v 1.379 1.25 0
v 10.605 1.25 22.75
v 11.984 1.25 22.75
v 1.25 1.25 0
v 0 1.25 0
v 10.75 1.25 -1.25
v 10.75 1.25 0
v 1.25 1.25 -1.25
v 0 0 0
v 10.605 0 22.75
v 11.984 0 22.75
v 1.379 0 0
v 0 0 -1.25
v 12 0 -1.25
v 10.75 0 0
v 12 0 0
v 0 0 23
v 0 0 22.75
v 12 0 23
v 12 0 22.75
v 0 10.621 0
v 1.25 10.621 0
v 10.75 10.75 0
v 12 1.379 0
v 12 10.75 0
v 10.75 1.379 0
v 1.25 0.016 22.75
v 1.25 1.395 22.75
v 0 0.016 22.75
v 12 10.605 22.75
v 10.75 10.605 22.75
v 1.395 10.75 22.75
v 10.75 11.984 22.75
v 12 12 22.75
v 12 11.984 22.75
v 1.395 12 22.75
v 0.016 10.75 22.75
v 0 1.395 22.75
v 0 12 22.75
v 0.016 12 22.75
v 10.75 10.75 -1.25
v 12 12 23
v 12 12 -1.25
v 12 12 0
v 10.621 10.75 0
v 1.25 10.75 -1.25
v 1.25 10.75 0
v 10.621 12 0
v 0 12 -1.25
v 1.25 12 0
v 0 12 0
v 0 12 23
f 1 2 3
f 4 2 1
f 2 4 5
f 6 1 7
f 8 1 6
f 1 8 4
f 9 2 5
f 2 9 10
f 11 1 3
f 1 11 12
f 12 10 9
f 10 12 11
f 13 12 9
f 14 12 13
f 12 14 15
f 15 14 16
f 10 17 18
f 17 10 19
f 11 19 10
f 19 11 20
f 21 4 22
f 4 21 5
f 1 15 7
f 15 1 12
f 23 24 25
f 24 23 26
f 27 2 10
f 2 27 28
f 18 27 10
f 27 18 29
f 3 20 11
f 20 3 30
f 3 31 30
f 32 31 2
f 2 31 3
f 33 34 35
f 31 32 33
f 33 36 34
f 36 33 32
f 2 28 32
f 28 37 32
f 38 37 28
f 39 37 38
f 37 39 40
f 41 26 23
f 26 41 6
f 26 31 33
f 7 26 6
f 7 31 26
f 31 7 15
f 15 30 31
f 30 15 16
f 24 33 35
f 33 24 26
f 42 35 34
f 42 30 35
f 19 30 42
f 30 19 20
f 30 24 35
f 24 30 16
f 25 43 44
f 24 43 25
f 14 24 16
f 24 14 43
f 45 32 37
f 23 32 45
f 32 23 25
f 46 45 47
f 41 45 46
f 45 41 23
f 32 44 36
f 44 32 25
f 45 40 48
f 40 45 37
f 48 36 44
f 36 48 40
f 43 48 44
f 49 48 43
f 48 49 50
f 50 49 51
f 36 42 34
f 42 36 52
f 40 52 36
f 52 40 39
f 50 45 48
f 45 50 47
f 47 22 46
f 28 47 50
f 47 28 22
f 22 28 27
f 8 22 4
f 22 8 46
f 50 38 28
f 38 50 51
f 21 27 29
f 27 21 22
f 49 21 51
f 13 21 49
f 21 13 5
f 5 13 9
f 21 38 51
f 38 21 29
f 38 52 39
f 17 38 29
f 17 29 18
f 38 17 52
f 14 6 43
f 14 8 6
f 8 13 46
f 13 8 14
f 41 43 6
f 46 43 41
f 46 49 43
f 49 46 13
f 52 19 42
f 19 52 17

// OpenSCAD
$fn = 200;

// all measurements in inches
arm_thickness = 1+1/4;
seat = 12;
height = 24 - arm_thickness;
thickness = 1/4;

module arm(height, thickness=arm_thickness, angle=0) {
    length = height/cos(angle) + thickness*tan(angle);
    echo(length);
    max_ = 2*max(thickness,height,length);
    difference () {
            rotate([0,angle,0])
            translate([thickness,0,0])
            rotate([0,-90,0])
                cube([length,thickness,thickness]);
        translate([-1, -1, -max_]) cube(max_);
        translate([-1, -1, height]) cube(max_);
    }
}

module seat(size, thickness) {
    cube([size, size, thickness]);
}

module chair() {
    arm_angle = atan((seat-arm_thickness)/height)-0.3;
    echo(arm_angle);
    translate([0,0,height]) seat(seat, thickness);    
    arm(height, angle=arm_angle);
    translate([seat,0,0]) rotate([0,0,90]) arm(height, angle=arm_angle);
    translate([seat,seat,0]) rotate([0,0,180]) arm(height, angle=arm_angle);
    translate([0,seat,0]) rotate([0,0,-90]) arm(height, angle=arm_angle);
    
    rotate([0,90,0]) arm(seat);
    translate([arm_thickness,0,0]) rotate([0,90,90]) arm(seat);
    translate([0,seat-arm_thickness,0]) rotate([0,90,0]) arm(seat);
    translate([seat,0,0]) rotate([0,90,90]) arm(seat);
}

function chair_dim() = [seat,seat,height];

chair();
